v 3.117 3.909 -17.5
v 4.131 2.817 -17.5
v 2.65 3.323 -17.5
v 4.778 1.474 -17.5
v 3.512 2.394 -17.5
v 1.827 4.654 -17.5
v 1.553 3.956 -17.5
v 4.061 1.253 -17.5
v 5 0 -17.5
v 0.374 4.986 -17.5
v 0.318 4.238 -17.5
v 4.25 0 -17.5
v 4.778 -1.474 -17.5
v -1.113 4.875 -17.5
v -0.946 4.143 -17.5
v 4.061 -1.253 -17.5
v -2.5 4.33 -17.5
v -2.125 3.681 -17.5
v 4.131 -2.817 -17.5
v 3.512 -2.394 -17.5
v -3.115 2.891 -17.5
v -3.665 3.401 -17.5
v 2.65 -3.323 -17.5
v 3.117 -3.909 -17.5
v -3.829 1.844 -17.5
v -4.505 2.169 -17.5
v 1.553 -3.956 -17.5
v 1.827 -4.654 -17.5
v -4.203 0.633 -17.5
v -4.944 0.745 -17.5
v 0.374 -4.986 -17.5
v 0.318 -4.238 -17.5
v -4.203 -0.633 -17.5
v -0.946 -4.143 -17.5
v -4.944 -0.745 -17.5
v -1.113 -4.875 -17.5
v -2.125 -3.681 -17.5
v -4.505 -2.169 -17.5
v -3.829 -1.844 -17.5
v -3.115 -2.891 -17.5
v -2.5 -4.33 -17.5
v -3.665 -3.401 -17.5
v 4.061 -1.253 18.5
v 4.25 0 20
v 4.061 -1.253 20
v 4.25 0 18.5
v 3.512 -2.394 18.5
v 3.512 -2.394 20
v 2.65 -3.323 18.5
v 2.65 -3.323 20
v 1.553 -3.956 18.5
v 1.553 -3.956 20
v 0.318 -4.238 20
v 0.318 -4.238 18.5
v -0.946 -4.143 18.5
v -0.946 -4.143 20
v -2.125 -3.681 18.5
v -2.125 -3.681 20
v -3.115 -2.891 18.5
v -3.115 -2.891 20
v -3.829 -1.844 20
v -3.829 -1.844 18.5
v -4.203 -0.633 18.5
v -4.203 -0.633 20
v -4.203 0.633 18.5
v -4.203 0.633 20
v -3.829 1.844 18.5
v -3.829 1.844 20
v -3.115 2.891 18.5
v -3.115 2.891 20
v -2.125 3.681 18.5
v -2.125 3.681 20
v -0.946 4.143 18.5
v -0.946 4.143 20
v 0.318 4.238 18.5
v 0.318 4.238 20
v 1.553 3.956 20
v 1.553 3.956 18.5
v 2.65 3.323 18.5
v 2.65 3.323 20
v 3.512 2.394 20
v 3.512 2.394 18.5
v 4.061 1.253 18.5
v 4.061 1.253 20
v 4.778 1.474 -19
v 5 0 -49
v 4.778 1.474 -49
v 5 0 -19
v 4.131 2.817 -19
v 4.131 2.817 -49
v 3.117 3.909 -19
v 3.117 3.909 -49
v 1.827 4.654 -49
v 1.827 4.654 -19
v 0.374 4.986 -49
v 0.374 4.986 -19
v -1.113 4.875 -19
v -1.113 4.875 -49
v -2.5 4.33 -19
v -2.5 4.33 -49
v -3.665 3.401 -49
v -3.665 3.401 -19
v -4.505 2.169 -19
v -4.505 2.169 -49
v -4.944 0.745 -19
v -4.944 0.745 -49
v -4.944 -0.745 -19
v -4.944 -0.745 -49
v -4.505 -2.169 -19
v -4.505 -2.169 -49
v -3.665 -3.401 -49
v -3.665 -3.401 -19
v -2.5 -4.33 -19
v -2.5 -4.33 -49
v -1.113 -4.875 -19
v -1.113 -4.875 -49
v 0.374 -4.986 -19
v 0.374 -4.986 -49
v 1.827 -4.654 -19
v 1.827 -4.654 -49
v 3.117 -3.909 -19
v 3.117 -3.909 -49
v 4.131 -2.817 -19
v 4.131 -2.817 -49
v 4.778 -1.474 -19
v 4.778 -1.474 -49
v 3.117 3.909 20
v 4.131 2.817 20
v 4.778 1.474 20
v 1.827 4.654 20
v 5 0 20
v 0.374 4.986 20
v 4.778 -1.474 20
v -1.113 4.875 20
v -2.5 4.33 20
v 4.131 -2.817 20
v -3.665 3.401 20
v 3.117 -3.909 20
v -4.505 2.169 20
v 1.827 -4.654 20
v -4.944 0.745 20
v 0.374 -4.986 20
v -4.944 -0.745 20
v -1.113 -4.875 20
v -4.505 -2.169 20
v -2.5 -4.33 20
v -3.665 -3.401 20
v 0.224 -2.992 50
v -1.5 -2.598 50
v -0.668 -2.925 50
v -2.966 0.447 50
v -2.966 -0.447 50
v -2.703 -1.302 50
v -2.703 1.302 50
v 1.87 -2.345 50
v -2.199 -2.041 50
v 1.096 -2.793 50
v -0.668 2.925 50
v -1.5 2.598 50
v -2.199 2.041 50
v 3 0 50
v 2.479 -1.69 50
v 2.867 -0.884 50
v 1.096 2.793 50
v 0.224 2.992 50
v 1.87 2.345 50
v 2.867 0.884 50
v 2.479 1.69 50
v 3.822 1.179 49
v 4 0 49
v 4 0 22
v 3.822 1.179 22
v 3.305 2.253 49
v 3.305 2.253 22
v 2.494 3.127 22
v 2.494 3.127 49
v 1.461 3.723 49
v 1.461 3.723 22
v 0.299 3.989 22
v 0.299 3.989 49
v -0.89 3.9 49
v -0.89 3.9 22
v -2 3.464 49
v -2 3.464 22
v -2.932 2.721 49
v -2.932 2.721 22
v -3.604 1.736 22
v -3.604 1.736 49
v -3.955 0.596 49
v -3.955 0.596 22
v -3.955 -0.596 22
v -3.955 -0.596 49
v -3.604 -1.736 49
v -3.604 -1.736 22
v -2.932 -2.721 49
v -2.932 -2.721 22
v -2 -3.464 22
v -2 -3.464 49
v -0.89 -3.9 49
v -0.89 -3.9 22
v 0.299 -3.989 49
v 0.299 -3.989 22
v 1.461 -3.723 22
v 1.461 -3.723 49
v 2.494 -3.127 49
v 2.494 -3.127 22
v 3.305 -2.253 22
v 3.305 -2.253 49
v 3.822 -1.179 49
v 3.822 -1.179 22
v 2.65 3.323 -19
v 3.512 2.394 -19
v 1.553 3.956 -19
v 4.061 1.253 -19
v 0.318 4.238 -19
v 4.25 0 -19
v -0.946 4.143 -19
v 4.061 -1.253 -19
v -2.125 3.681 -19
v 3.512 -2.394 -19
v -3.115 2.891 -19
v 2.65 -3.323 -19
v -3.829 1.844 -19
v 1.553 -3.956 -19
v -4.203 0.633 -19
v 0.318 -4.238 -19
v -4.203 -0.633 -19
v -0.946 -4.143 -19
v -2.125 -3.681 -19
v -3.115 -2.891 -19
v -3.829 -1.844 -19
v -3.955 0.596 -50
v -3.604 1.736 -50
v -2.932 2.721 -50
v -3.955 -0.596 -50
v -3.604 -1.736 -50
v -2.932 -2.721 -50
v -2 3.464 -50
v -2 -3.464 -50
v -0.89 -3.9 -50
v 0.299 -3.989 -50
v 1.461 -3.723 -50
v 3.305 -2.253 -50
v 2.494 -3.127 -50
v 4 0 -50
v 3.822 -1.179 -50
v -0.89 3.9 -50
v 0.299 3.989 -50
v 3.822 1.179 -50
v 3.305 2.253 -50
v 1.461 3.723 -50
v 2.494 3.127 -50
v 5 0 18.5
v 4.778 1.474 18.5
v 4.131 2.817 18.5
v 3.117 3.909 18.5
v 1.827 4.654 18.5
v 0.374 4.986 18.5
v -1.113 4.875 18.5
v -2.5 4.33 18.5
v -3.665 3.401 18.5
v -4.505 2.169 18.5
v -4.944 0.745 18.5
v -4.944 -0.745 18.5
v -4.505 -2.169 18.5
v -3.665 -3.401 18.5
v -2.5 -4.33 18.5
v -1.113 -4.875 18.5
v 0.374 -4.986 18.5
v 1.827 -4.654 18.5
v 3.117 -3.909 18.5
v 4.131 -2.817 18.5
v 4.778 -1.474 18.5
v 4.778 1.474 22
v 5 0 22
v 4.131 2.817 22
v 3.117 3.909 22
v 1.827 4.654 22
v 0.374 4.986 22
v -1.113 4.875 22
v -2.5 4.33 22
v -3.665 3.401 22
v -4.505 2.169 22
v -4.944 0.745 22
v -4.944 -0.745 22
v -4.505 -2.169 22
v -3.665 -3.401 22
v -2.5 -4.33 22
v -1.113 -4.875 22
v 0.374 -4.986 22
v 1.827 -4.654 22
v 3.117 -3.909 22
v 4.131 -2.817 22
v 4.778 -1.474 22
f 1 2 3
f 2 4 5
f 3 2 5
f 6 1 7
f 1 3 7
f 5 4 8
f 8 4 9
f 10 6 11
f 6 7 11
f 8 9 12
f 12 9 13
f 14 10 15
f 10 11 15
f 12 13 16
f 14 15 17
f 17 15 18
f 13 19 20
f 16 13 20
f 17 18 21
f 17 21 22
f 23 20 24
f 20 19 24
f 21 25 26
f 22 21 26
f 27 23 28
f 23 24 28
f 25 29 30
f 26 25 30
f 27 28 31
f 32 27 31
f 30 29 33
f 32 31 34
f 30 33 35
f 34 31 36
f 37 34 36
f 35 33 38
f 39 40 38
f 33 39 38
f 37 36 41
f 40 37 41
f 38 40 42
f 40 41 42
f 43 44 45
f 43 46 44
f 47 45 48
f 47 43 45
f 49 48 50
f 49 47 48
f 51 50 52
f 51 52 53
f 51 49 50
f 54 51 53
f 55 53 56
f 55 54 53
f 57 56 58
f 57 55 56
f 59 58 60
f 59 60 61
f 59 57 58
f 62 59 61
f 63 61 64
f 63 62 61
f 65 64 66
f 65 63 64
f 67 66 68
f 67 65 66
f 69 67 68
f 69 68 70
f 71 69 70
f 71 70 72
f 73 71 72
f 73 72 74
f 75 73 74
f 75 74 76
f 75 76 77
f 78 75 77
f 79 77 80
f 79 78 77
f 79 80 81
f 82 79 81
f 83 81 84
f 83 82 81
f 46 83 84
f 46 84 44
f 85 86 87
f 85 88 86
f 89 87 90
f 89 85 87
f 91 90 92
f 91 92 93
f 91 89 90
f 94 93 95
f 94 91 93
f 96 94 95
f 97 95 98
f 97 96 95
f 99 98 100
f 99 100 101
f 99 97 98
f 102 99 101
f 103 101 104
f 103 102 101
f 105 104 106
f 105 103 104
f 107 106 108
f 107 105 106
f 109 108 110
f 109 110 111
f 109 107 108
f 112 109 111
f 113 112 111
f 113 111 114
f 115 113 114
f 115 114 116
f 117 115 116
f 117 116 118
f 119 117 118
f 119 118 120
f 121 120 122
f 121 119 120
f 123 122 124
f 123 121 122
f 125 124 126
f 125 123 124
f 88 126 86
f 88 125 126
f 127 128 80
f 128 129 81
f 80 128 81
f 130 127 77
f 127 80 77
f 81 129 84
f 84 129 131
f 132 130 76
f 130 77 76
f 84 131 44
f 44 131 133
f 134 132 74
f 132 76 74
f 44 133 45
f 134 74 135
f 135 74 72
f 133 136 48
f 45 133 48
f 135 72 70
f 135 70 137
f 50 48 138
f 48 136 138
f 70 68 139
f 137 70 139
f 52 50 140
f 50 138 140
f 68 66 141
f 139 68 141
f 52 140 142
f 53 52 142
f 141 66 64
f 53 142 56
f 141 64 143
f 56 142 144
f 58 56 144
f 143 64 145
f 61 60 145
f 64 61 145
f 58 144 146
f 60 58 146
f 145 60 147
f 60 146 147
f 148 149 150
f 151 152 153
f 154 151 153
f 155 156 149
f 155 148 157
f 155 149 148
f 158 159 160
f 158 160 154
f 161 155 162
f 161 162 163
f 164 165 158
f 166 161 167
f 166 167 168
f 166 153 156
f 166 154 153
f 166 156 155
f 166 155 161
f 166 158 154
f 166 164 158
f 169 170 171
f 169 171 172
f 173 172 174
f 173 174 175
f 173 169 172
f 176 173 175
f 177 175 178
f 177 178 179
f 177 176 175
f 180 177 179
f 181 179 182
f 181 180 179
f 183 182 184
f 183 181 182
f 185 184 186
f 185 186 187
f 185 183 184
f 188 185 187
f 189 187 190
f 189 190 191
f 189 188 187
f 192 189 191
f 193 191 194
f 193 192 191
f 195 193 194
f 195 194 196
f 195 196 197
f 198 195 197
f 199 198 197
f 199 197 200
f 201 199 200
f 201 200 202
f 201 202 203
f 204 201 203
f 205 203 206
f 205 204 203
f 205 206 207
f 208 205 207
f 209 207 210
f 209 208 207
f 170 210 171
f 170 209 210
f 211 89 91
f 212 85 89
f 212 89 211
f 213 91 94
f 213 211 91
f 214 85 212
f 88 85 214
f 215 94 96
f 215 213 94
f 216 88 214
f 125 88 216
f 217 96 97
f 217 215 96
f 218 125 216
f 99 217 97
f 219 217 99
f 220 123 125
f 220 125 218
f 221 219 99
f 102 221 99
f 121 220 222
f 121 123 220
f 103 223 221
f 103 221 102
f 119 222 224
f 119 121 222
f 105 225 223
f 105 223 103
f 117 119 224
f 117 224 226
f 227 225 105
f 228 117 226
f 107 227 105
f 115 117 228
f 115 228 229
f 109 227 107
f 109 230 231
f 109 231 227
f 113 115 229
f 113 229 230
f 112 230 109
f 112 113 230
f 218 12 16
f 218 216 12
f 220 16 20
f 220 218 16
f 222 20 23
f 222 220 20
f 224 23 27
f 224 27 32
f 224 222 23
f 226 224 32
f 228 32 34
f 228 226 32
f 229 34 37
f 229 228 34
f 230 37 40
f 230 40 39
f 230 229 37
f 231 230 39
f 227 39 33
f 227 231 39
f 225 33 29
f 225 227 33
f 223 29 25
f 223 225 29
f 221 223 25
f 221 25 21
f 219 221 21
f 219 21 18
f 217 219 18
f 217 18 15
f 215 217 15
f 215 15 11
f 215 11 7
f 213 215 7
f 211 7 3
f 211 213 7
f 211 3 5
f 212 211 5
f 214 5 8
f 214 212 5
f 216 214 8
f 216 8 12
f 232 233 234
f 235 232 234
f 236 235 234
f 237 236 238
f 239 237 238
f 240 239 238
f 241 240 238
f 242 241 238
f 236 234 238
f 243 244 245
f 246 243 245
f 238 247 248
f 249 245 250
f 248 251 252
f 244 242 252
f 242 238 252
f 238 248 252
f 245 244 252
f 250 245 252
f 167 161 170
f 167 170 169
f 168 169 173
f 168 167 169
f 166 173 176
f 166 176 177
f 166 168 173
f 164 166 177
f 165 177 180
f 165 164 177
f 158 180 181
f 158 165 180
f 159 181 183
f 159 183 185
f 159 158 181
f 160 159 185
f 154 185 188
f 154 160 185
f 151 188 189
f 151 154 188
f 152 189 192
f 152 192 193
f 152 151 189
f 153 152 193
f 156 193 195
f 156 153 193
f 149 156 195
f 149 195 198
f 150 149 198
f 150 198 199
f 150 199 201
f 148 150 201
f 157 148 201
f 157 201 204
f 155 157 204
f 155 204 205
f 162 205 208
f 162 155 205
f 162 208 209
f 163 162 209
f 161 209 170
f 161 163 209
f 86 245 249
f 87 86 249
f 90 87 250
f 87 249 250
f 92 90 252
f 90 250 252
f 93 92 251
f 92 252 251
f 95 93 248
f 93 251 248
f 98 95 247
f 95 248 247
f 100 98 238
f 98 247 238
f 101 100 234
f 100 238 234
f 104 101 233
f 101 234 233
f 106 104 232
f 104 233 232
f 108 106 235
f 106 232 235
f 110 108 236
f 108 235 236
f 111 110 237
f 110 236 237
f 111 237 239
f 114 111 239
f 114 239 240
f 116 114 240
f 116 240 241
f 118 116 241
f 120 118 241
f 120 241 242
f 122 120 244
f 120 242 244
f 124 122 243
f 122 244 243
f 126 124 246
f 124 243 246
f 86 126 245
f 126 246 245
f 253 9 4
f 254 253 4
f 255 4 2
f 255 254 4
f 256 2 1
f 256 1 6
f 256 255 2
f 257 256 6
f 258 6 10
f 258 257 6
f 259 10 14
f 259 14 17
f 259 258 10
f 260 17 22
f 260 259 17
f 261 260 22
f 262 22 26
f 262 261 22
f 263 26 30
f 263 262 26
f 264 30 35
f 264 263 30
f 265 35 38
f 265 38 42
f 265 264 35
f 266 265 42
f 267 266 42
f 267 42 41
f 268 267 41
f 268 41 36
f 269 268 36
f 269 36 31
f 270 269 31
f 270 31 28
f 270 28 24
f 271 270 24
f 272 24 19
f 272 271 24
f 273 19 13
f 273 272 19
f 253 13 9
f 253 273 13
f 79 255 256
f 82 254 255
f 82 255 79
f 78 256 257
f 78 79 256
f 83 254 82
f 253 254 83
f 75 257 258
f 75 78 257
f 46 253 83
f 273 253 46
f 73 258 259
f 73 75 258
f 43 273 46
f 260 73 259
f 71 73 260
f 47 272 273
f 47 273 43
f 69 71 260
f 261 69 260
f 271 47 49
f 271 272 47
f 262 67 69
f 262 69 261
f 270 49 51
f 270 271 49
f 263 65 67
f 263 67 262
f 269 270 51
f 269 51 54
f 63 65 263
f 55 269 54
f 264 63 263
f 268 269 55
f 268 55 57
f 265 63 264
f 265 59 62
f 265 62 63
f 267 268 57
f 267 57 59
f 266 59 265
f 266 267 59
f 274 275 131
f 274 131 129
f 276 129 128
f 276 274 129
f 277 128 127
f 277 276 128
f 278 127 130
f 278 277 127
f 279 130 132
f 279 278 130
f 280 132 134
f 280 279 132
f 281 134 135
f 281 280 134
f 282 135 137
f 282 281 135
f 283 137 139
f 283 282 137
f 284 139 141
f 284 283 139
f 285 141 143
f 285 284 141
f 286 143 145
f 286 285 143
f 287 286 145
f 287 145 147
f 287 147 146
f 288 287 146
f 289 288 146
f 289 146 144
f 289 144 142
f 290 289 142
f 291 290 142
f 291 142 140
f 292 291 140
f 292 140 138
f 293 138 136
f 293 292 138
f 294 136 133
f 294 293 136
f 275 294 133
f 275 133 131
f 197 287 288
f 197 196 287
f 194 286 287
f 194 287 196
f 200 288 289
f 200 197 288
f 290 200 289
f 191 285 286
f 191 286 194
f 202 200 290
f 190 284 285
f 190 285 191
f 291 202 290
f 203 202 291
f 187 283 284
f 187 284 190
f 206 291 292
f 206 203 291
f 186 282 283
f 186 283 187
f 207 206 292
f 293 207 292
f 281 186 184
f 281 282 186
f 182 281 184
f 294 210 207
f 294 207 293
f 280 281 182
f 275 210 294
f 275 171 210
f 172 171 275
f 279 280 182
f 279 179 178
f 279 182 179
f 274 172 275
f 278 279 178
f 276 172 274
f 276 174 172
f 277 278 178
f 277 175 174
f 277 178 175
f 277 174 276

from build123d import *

# Parameters (mm, degrees)
CROQUIS1_R              = 5
SALIENTE_EXTRUIR1_DEPTH = 50
CHAFL_N1_SIZE           = 1
CROQUIS4_W              = 1.5
CROQUIS4_H              = 1.5
CROQUIS5_OUTSIDE_W      = 32.2
CROQUIS5_OUTSIDE_H      = 32.2
CROQUIS5_OUTSIDE_R      = 4
CORTAR_EXTRUIR2_DEPTH   = 28
CHAFL_N3_SIZE           = 1


with BuildPart() as part:
    # Croquis1 → Saliente-Extruir1 (new, symmetric)
    with BuildSketch(Plane.XY):
        Circle(CROQUIS1_R)
    extrude(amount=SALIENTE_EXTRUIR1_DEPTH, both=True)

    # Chaflán1
    chafl_n1_edges = [part.edges().sort_by_distance(p)[0] for p in [
        (-5, 0, -50),
    ]]
    chamfer(chafl_n1_edges, length=CHAFL_N1_SIZE)

    # Croquis4 → Cortar-Revolución2 (revolve, cut)
    with BuildSketch(Plane(origin=(0, 0, 0), x_dir=(1, 0, 0), z_dir=(0, 1, 0))):
        with Locations((5, 18.25)):
            Rectangle(CROQUIS4_W, CROQUIS4_H)
        with Locations((5, -19.25)):
            Rectangle(CROQUIS4_W, CROQUIS4_H)
    revolve(axis=Axis((0, 0, 0), (0, 0, -1)), mode=Mode.SUBTRACT)

    # Croquis5 outside → Cortar-Extruir2 (cut)
    with BuildSketch(Plane.XY.offset(50)):
        Rectangle(CROQUIS5_OUTSIDE_W, CROQUIS5_OUTSIDE_H)
        Circle(CROQUIS5_OUTSIDE_R, mode=Mode.SUBTRACT)
    extrude(amount=-CORTAR_EXTRUIR2_DEPTH, mode=Mode.SUBTRACT)

    # Chaflán3
    chafl_n3_edges = [part.edges().sort_by_distance(p)[0] for p in [
        (-4, 0, 50),
    ]]
    chamfer(chafl_n3_edges, length=CHAFL_N3_SIZE)


solid = part.part
